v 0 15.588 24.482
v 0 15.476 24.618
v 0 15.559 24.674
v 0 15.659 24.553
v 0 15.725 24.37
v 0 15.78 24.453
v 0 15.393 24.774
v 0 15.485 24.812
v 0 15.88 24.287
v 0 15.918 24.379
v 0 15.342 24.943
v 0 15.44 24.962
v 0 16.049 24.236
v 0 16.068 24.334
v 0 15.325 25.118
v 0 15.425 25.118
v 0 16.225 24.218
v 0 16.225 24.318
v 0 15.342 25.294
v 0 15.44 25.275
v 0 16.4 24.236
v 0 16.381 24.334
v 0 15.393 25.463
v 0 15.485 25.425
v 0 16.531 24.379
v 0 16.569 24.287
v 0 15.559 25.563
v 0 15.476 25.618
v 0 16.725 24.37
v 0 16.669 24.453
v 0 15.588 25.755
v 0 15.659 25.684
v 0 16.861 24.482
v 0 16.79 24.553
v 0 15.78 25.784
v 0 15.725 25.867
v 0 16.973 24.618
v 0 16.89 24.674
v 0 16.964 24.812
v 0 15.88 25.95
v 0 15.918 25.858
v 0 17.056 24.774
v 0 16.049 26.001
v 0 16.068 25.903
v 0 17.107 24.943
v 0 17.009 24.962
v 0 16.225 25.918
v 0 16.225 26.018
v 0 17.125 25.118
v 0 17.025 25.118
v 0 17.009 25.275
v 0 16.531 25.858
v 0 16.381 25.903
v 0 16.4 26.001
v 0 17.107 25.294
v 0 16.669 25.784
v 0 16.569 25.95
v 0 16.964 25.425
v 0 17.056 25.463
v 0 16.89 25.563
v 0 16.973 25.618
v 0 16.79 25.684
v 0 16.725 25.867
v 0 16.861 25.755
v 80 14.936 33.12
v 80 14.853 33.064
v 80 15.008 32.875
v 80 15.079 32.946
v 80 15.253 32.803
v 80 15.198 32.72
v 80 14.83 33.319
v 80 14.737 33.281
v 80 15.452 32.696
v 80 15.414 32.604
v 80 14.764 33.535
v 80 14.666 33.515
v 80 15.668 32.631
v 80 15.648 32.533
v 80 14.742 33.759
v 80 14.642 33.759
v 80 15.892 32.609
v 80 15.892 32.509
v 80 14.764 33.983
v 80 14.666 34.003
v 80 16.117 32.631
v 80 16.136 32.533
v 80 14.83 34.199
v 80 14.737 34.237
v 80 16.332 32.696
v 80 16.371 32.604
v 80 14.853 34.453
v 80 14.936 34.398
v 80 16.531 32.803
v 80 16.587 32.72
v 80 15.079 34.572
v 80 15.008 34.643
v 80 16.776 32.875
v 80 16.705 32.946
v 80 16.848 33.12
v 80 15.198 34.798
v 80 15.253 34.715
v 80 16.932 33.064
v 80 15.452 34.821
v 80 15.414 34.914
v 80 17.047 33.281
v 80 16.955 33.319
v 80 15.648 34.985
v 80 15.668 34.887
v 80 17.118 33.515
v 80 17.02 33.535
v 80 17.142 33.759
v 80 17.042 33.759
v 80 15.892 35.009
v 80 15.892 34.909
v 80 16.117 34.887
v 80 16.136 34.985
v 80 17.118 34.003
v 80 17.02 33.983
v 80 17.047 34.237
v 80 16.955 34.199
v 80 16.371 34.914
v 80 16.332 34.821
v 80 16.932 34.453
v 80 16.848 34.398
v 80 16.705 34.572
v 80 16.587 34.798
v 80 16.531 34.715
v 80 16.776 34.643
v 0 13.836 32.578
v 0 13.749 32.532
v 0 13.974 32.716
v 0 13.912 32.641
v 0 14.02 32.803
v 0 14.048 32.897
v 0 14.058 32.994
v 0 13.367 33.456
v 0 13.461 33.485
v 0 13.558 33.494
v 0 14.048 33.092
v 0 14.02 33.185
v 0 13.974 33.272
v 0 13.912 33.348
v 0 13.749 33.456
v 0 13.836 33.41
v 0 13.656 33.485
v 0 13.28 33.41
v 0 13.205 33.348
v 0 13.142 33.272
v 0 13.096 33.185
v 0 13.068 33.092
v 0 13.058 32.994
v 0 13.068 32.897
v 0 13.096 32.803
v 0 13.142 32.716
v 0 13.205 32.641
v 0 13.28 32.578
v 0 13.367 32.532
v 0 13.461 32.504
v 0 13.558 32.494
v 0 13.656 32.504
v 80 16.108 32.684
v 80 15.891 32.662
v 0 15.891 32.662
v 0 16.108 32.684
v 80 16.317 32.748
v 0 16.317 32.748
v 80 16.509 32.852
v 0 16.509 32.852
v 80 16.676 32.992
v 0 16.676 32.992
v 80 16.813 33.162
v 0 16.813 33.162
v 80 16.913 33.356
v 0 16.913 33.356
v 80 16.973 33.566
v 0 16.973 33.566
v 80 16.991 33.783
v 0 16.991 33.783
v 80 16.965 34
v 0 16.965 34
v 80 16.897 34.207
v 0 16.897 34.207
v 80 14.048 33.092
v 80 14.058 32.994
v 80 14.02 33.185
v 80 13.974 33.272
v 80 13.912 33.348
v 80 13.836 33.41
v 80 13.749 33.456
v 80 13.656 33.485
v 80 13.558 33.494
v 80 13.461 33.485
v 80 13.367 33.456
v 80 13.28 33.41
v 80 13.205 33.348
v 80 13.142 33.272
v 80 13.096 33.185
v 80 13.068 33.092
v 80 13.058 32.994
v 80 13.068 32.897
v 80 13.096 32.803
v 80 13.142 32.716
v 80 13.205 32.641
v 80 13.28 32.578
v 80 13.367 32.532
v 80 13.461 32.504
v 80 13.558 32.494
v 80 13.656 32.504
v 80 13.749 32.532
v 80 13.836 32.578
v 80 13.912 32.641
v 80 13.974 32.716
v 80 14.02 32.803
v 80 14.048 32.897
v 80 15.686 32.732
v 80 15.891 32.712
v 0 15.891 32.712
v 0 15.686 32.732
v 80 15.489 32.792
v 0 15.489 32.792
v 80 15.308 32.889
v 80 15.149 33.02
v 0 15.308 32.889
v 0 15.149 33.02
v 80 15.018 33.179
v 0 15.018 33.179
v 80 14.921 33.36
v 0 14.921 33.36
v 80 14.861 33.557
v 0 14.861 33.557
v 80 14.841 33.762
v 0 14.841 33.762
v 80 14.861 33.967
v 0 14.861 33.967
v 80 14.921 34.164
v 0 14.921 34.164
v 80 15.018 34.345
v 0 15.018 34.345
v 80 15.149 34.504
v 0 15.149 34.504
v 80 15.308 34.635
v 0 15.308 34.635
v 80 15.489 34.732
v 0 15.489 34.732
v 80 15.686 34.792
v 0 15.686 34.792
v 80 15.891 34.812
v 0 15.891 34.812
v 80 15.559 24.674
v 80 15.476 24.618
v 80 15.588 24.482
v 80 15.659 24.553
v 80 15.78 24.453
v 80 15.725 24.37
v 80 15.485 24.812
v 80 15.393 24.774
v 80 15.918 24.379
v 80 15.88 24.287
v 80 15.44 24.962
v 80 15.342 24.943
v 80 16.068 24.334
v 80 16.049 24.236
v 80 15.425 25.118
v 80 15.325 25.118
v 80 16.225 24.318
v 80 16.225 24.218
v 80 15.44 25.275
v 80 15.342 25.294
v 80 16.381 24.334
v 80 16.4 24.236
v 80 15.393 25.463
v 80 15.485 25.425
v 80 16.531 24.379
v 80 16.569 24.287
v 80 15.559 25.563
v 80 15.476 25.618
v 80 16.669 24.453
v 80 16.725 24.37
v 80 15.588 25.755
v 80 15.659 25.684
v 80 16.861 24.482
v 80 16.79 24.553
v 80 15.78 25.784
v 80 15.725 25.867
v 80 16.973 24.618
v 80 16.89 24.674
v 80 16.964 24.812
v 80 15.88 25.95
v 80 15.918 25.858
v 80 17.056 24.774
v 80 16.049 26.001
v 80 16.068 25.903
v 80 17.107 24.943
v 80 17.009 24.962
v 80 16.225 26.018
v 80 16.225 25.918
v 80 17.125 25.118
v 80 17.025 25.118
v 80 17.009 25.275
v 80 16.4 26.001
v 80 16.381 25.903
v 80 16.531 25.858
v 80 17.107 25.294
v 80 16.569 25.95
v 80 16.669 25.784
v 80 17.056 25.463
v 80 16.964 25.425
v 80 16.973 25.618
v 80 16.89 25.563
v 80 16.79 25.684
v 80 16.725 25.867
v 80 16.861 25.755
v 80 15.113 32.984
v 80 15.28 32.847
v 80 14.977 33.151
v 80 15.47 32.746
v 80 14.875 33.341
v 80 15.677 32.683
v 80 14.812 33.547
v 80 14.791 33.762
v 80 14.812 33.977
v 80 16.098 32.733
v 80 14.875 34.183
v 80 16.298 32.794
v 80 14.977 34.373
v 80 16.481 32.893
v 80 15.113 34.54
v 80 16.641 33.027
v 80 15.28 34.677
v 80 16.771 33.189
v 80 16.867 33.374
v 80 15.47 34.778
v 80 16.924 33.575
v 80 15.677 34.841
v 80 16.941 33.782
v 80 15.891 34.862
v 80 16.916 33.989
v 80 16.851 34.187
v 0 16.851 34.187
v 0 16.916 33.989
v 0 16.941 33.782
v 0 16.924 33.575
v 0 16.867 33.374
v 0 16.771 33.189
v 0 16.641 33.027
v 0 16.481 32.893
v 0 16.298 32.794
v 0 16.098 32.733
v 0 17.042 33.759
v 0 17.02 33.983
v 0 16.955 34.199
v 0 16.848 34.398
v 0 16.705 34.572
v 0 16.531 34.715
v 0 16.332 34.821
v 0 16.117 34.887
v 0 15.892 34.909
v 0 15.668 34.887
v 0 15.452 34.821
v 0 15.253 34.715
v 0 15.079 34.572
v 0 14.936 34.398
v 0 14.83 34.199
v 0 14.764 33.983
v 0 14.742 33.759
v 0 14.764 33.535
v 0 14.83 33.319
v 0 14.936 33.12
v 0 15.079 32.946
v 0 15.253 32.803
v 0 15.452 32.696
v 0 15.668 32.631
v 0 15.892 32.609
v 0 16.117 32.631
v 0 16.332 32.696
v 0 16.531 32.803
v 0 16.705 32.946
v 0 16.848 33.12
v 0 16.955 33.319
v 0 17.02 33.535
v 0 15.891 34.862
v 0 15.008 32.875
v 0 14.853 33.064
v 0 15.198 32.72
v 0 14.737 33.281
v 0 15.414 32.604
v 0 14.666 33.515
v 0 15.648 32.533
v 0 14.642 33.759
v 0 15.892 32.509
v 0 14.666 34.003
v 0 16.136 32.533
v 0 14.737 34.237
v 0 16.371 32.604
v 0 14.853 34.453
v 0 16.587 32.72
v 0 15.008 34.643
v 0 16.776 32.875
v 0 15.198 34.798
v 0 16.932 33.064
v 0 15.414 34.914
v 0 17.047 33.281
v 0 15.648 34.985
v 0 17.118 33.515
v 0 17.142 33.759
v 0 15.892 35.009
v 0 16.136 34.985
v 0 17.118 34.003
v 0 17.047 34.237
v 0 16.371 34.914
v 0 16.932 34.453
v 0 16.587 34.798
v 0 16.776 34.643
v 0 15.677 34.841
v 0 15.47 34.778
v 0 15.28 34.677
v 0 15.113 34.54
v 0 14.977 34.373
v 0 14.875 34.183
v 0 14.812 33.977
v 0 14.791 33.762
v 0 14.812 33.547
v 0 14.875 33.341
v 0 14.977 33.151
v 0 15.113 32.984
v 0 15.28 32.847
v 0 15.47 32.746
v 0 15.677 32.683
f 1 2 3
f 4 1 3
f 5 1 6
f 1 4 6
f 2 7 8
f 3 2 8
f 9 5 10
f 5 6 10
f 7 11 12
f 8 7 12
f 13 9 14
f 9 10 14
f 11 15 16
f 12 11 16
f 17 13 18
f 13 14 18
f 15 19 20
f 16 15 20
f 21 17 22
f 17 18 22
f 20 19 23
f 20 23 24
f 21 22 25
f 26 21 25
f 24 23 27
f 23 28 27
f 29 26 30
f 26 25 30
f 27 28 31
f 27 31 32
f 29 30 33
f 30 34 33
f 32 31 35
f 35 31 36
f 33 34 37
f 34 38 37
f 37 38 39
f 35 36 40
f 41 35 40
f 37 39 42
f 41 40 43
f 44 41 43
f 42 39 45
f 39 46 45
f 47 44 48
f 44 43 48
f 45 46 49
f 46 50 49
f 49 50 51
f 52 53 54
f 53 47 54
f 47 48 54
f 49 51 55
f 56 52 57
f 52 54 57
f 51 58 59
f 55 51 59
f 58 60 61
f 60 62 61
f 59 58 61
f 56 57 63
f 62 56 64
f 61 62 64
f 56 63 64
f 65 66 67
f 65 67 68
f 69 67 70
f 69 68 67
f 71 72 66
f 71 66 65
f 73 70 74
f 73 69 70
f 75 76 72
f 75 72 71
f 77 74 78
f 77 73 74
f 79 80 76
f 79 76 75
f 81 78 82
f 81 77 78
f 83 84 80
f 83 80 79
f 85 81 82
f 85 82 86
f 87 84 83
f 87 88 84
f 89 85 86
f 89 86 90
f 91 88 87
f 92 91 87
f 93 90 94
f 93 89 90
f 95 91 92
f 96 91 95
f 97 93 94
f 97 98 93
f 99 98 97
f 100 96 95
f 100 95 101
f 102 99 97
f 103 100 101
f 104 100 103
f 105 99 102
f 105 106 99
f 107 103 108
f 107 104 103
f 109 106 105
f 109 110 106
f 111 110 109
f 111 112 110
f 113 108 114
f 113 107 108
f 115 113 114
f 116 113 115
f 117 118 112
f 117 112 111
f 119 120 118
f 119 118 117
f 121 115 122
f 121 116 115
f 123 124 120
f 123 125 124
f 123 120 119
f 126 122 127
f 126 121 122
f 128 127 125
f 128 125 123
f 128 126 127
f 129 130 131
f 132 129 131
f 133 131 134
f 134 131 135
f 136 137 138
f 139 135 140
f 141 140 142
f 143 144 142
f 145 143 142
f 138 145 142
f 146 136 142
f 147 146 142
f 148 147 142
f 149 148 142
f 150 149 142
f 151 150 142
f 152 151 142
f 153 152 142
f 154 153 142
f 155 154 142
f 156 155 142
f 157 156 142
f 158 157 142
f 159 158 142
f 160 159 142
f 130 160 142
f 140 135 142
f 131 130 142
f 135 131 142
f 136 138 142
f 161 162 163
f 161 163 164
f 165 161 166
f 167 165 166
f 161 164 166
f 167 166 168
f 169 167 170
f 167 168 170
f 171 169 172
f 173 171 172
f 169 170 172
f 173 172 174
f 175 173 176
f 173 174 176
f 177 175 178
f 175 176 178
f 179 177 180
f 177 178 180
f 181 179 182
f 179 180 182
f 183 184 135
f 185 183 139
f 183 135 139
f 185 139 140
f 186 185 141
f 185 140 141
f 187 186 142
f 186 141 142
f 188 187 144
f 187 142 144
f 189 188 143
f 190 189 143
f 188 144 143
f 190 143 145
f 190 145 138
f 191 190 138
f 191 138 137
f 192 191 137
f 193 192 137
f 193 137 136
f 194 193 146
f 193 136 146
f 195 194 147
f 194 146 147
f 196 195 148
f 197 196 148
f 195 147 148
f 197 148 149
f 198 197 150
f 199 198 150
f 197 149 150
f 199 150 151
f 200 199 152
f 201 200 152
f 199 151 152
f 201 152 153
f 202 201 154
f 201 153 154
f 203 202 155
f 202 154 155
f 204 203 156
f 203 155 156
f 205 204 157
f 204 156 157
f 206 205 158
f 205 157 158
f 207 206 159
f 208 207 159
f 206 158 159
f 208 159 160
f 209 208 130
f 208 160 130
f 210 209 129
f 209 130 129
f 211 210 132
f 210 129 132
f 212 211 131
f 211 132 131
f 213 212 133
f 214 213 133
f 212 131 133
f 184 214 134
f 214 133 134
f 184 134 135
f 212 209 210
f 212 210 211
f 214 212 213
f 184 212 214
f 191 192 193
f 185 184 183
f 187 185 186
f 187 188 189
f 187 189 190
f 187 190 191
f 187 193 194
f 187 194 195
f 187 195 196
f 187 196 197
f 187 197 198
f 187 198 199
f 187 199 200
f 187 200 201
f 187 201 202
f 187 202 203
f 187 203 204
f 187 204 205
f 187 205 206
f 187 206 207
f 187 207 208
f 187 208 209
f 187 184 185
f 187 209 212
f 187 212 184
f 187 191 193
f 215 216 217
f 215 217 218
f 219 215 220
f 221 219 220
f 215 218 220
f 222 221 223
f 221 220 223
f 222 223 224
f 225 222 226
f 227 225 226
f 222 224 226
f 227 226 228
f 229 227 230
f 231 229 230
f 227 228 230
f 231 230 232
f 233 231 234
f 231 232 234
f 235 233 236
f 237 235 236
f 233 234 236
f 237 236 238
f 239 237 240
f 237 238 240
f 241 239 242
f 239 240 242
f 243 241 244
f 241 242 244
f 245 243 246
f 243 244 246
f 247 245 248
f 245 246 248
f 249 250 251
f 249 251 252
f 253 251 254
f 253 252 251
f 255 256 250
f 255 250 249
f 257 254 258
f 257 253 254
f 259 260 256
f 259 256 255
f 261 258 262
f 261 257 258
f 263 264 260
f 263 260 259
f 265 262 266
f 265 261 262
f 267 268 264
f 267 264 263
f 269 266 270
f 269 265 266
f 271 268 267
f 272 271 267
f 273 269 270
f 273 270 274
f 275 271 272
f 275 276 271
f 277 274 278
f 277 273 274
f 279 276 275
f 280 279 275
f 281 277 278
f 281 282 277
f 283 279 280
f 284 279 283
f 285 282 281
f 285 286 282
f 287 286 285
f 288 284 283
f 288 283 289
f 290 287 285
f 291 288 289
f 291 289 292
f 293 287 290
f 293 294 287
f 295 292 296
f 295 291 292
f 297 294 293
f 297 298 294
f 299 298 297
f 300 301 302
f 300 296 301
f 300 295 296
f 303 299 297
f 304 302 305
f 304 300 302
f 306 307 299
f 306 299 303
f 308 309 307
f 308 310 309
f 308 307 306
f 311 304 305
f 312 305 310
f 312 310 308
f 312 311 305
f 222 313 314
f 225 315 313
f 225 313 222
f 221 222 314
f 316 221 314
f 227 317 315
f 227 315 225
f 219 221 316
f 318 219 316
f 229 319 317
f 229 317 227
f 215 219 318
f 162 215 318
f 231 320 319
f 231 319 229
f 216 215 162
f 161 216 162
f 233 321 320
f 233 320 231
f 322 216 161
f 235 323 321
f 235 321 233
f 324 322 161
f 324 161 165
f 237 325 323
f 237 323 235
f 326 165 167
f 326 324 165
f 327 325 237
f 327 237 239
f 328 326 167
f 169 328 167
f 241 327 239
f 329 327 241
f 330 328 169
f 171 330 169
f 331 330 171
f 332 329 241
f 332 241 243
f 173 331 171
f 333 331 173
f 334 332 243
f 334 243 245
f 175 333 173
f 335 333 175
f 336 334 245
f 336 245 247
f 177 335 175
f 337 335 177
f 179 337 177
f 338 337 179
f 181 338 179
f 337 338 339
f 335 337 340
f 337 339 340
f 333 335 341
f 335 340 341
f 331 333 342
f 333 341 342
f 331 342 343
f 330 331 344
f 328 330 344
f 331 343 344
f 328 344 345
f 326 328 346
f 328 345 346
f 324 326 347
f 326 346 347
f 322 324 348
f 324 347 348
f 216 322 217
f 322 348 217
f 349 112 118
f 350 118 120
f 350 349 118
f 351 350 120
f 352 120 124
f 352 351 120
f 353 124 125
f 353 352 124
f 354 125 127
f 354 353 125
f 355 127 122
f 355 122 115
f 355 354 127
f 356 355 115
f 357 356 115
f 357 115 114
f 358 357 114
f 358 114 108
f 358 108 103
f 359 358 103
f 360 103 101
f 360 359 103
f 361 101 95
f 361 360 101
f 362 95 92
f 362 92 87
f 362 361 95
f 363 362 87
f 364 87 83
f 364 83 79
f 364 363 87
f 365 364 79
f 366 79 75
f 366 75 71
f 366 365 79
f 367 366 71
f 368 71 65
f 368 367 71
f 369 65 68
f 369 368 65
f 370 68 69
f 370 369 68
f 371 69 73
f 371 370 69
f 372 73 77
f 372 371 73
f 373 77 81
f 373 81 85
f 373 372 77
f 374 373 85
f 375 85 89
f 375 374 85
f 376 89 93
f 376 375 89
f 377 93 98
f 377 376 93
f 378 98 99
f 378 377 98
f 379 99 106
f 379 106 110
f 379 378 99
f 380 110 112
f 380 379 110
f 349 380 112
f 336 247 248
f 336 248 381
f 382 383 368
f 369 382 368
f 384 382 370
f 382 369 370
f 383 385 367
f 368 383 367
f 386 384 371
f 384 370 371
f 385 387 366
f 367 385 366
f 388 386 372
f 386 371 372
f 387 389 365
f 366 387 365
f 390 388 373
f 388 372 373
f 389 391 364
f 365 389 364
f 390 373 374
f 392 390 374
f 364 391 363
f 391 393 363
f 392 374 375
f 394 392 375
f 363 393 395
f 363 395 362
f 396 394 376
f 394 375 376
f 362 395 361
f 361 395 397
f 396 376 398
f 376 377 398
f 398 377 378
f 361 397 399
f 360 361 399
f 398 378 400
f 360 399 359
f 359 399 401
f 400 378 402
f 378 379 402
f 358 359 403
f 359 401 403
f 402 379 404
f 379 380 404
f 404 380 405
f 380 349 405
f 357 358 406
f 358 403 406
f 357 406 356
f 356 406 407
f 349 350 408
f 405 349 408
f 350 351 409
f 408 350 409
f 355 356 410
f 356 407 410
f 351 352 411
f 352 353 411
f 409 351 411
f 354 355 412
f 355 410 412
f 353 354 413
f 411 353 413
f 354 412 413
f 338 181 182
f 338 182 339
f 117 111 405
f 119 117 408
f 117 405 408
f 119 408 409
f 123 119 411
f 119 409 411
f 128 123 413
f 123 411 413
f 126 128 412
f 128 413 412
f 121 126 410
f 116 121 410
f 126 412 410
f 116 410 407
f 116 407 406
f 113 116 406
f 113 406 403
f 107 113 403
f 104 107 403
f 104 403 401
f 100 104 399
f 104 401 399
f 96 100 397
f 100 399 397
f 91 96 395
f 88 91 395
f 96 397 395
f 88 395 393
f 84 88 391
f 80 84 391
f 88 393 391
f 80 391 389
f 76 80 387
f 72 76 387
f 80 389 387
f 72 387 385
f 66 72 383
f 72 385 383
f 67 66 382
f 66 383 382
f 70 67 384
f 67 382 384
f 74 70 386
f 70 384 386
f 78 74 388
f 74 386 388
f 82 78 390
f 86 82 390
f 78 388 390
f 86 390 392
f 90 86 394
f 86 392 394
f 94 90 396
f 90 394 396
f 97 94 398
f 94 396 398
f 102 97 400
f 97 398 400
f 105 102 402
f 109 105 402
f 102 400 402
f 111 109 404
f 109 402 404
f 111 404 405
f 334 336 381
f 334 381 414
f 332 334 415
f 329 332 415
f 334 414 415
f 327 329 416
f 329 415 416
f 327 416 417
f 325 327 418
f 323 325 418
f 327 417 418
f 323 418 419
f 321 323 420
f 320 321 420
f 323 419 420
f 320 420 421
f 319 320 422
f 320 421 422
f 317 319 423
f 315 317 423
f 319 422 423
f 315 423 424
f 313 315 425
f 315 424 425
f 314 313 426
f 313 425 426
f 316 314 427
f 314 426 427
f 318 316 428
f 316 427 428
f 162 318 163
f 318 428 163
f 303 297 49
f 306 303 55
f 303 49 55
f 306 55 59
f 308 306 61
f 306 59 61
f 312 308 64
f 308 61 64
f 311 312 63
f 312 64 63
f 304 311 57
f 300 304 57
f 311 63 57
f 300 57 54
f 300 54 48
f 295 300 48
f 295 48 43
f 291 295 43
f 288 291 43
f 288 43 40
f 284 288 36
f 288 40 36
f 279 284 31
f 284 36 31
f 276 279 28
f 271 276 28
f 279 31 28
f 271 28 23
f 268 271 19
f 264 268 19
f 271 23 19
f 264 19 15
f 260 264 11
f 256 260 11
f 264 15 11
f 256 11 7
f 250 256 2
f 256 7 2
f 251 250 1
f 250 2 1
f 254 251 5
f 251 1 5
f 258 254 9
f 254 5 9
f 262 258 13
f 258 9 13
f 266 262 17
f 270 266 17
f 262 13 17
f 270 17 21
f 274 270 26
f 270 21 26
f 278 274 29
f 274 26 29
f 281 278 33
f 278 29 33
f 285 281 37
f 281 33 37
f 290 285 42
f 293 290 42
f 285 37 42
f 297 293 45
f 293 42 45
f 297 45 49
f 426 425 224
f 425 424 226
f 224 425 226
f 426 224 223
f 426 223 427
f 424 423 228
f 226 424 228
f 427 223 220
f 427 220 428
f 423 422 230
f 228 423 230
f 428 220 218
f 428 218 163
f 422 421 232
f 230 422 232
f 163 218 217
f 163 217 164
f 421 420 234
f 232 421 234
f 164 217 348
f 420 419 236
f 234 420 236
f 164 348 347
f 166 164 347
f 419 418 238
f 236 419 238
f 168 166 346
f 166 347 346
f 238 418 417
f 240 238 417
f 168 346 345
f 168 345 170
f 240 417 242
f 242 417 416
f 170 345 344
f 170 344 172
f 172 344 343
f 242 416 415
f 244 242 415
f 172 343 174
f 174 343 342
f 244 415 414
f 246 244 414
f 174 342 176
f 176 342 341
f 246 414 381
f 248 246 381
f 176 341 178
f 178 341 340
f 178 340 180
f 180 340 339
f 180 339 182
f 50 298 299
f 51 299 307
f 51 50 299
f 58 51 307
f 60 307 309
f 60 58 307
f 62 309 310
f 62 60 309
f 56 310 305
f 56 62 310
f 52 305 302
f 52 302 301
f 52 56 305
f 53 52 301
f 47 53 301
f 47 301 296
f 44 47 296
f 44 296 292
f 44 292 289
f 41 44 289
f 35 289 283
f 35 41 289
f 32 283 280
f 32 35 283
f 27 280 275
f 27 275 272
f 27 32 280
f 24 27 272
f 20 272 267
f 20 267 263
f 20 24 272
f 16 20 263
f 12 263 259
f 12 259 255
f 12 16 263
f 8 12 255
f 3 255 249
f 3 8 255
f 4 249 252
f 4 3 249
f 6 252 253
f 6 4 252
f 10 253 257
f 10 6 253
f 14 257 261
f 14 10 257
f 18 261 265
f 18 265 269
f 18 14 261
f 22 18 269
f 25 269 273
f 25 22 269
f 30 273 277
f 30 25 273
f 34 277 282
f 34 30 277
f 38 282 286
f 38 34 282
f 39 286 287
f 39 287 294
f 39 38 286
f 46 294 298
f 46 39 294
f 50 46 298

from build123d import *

# Parameters (mm, degrees)
F0_R     = 1.25
F0_R_2   = 1.15
F1_DEPTH = 80
F2_R     = 0.9
F2_R_2   = 0.8
F3_DEPTH = 80
F5_DEPTH = 80
F6_R     = 0.5
F7_DEPTH = 80


with BuildPart() as f1:
    # F0 (on Right) → F1 (new body)
    with BuildSketch(Plane.YZ):
        with Locations((15.892187, 33.758856)):
            Circle(F0_R)
        with Locations((15.892187, 33.758856)):
            Circle(F0_R_2, mode=Mode.SUBTRACT)
    extrude(amount=F1_DEPTH)


with BuildPart() as f3:
    # F2 (on Right) → F3 (new body)
    with BuildSketch(Plane.YZ):
        with Locations((16.224561, 25.118472)):
            Circle(F2_R)
        with Locations((16.224561, 25.118472)):
            Circle(F2_R_2, mode=Mode.SUBTRACT)
    extrude(amount=F3_DEPTH)


with BuildPart() as f5:
    # F4 (on Right) → F5 (new body)
    with BuildSketch(Plane.YZ):
        with BuildLine():
            Line((15.891133, 34.811989), (15.891133, 34.861989))
            ThreePointArc((15.891133, 34.861989), (14.791133, 33.761989), (15.891133, 32.661989))
            Line((15.891133, 32.661989), (15.891133, 32.711989))
            ThreePointArc((15.891133, 32.711989), (14.841133, 33.761989), (15.891133, 34.811989))
        make_face()
        with BuildLine():
            Line((15.891133, 32.711989), (15.891133, 32.661989))
            ThreePointArc((15.891133, 32.661989), (16.813033, 33.161906), (16.896982, 34.207262))
            Line((16.896982, 34.207262), (16.851261, 34.187022))
            ThreePointArc((16.851261, 34.187022), (16.771129, 33.189183), (15.891133, 32.711989))
        make_face()
    extrude(amount=F5_DEPTH)


with BuildPart() as f7:
    # F6 (on Right) → F7 (new body)
    with BuildSketch(Plane.YZ):
        with Locations((13.55806, 32.99414)):
            Circle(F6_R)
    extrude(amount=F7_DEPTH)


solid = Compound([f1.part, f3.part, f5.part, f7.part])
